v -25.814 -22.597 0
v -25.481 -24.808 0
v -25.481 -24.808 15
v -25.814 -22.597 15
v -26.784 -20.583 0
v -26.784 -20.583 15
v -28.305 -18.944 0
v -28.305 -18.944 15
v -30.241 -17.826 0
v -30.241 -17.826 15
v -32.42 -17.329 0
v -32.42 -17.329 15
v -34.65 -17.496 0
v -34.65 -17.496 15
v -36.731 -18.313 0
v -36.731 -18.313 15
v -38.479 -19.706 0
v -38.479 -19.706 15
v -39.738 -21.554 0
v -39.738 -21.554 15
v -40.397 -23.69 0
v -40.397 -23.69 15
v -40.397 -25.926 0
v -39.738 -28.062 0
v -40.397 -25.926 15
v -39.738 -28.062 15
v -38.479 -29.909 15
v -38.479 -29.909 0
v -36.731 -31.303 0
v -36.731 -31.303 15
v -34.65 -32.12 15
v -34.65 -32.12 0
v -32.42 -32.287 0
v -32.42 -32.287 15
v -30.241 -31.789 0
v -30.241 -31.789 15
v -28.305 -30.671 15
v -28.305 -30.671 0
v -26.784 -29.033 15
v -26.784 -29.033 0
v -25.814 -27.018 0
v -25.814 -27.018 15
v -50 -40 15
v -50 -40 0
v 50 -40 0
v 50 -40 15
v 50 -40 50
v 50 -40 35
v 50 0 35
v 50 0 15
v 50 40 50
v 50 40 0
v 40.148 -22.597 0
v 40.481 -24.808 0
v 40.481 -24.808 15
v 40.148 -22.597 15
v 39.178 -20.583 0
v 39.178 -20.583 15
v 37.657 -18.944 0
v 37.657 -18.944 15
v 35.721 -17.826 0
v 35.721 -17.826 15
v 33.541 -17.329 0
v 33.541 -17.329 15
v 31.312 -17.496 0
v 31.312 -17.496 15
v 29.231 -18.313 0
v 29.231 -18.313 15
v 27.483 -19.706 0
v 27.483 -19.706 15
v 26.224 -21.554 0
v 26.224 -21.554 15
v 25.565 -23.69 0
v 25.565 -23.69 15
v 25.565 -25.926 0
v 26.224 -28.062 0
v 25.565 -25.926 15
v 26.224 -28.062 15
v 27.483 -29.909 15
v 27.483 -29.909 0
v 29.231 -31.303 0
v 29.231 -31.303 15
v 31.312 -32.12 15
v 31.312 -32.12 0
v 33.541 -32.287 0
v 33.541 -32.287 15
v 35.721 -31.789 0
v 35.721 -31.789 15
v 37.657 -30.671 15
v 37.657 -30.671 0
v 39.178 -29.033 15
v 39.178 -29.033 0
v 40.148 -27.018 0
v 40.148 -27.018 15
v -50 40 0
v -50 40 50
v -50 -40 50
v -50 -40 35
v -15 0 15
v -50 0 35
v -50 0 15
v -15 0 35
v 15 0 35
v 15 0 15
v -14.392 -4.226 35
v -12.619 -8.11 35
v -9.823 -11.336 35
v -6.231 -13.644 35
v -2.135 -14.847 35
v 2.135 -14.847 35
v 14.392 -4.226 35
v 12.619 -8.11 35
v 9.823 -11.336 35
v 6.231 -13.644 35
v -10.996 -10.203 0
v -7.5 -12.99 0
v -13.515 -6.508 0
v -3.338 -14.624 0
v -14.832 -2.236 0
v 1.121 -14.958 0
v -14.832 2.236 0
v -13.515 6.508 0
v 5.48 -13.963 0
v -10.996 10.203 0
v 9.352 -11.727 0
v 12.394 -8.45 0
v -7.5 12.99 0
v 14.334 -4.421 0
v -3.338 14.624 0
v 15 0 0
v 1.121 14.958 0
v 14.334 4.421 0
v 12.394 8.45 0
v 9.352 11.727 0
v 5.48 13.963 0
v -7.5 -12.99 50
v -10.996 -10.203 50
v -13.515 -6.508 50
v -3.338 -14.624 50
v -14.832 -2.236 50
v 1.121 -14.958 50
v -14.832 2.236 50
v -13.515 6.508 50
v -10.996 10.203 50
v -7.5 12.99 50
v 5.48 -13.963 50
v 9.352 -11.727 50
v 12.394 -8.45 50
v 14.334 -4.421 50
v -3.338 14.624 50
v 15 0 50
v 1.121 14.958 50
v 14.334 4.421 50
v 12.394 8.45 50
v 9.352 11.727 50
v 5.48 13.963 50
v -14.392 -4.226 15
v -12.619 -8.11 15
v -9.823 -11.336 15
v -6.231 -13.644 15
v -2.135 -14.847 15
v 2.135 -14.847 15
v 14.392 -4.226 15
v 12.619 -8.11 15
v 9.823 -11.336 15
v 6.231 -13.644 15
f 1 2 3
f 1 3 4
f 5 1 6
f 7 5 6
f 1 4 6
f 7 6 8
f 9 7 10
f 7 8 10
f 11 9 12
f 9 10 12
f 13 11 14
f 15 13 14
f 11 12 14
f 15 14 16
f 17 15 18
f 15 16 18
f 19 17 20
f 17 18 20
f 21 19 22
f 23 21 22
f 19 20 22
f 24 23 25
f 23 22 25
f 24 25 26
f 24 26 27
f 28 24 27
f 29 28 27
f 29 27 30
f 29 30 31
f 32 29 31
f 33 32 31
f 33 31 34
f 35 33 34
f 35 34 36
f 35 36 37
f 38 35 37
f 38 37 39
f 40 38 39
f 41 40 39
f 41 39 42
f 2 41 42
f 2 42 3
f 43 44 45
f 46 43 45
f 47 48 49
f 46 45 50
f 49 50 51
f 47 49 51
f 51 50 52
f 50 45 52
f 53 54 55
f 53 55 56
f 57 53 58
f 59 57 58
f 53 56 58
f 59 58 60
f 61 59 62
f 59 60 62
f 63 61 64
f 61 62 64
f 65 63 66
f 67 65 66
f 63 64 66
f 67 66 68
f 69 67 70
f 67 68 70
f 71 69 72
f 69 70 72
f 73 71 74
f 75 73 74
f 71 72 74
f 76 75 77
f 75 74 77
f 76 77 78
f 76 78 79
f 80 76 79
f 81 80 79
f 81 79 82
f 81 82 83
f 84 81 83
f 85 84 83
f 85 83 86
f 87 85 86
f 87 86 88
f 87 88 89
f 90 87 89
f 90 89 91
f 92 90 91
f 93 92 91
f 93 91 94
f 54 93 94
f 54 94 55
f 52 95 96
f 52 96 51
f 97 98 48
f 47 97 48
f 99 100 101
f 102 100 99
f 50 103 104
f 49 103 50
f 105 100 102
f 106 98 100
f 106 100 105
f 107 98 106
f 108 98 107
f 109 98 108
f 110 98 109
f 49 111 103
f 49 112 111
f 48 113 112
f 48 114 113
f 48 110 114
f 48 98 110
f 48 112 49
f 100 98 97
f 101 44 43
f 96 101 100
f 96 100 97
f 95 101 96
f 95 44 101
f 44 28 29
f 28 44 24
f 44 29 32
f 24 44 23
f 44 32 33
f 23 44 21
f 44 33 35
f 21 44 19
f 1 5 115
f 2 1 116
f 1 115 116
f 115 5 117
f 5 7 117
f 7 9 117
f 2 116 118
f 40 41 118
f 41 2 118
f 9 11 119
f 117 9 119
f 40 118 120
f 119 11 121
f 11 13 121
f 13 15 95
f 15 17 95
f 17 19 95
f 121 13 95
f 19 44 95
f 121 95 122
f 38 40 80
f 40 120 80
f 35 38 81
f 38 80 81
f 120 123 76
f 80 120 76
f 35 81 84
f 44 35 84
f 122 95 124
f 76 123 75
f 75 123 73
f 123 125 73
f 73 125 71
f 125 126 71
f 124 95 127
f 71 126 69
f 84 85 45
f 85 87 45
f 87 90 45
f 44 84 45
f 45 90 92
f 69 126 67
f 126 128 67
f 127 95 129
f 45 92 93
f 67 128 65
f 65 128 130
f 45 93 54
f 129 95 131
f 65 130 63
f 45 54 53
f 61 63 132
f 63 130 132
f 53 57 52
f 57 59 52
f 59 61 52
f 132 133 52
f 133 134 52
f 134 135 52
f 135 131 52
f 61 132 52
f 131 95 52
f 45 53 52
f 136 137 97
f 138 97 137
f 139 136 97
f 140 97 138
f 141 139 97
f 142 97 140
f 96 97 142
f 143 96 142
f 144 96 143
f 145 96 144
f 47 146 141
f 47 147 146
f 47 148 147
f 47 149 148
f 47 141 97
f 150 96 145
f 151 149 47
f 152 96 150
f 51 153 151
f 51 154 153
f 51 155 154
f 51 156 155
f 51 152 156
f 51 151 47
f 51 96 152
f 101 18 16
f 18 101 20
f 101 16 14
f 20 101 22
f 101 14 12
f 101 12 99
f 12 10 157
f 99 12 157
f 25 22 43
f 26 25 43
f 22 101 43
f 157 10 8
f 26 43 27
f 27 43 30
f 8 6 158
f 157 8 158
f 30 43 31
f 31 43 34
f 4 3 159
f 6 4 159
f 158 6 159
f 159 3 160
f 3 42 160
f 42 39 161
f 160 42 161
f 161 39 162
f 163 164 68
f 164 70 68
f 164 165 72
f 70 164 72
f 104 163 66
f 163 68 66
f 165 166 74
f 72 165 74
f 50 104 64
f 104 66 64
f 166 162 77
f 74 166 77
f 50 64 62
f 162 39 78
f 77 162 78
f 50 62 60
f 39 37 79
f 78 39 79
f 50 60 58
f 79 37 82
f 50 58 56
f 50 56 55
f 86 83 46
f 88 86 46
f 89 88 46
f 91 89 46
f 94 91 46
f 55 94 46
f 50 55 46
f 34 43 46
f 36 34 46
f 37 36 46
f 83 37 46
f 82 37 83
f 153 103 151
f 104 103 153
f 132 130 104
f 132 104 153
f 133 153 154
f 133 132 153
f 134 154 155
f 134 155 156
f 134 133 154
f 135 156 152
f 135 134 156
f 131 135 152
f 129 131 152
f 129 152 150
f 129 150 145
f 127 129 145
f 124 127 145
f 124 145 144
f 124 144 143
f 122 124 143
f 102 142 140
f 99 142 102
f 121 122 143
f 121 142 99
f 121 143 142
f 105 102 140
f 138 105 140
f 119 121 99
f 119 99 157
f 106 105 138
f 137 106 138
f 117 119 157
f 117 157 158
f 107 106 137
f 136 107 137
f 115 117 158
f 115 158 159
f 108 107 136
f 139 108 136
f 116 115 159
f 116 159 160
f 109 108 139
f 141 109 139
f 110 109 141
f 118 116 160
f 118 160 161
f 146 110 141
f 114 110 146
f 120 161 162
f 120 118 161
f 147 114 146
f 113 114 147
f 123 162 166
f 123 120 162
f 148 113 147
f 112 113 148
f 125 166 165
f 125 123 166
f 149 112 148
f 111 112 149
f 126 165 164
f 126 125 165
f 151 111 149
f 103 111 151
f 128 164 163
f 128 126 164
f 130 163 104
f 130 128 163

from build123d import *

# Parameters (mm, degrees)
F0_W     = 100
F0_H     = 80
F0_R     = 15
F1_DEPTH = 50
F2_W     = 120
F2_H     = 20
F3_DEPTH = 40
F4_R     = 7.5
F5_DEPTH = 25


with BuildPart() as f1:
    # F0 (on Top) → F1 (new body)
    with BuildSketch(Plane.XY):
        Rectangle(F0_W, F0_H)
        Circle(F0_R, mode=Mode.SUBTRACT)
    extrude(amount=F1_DEPTH)

    # F2 (on face) → F3 (cut)
    with BuildSketch(Plane.XZ.offset(40)):
        with Locations((3.9423131943, 25.000000596)):
            Rectangle(F2_W, F2_H)
    extrude(amount=-F3_DEPTH, mode=Mode.SUBTRACT)

    # F4 (on face) → F5 (cut)
    with BuildSketch(Plane.XY.offset(15.000000596)):
        with Locations((-32.9807698727, -24.8076934367)):
            Circle(F4_R)
        with Locations((32.9807698727, -24.8076934367)):
            Circle(F4_R)
    extrude(amount=-F5_DEPTH, mode=Mode.SUBTRACT)


solid = f1.part
